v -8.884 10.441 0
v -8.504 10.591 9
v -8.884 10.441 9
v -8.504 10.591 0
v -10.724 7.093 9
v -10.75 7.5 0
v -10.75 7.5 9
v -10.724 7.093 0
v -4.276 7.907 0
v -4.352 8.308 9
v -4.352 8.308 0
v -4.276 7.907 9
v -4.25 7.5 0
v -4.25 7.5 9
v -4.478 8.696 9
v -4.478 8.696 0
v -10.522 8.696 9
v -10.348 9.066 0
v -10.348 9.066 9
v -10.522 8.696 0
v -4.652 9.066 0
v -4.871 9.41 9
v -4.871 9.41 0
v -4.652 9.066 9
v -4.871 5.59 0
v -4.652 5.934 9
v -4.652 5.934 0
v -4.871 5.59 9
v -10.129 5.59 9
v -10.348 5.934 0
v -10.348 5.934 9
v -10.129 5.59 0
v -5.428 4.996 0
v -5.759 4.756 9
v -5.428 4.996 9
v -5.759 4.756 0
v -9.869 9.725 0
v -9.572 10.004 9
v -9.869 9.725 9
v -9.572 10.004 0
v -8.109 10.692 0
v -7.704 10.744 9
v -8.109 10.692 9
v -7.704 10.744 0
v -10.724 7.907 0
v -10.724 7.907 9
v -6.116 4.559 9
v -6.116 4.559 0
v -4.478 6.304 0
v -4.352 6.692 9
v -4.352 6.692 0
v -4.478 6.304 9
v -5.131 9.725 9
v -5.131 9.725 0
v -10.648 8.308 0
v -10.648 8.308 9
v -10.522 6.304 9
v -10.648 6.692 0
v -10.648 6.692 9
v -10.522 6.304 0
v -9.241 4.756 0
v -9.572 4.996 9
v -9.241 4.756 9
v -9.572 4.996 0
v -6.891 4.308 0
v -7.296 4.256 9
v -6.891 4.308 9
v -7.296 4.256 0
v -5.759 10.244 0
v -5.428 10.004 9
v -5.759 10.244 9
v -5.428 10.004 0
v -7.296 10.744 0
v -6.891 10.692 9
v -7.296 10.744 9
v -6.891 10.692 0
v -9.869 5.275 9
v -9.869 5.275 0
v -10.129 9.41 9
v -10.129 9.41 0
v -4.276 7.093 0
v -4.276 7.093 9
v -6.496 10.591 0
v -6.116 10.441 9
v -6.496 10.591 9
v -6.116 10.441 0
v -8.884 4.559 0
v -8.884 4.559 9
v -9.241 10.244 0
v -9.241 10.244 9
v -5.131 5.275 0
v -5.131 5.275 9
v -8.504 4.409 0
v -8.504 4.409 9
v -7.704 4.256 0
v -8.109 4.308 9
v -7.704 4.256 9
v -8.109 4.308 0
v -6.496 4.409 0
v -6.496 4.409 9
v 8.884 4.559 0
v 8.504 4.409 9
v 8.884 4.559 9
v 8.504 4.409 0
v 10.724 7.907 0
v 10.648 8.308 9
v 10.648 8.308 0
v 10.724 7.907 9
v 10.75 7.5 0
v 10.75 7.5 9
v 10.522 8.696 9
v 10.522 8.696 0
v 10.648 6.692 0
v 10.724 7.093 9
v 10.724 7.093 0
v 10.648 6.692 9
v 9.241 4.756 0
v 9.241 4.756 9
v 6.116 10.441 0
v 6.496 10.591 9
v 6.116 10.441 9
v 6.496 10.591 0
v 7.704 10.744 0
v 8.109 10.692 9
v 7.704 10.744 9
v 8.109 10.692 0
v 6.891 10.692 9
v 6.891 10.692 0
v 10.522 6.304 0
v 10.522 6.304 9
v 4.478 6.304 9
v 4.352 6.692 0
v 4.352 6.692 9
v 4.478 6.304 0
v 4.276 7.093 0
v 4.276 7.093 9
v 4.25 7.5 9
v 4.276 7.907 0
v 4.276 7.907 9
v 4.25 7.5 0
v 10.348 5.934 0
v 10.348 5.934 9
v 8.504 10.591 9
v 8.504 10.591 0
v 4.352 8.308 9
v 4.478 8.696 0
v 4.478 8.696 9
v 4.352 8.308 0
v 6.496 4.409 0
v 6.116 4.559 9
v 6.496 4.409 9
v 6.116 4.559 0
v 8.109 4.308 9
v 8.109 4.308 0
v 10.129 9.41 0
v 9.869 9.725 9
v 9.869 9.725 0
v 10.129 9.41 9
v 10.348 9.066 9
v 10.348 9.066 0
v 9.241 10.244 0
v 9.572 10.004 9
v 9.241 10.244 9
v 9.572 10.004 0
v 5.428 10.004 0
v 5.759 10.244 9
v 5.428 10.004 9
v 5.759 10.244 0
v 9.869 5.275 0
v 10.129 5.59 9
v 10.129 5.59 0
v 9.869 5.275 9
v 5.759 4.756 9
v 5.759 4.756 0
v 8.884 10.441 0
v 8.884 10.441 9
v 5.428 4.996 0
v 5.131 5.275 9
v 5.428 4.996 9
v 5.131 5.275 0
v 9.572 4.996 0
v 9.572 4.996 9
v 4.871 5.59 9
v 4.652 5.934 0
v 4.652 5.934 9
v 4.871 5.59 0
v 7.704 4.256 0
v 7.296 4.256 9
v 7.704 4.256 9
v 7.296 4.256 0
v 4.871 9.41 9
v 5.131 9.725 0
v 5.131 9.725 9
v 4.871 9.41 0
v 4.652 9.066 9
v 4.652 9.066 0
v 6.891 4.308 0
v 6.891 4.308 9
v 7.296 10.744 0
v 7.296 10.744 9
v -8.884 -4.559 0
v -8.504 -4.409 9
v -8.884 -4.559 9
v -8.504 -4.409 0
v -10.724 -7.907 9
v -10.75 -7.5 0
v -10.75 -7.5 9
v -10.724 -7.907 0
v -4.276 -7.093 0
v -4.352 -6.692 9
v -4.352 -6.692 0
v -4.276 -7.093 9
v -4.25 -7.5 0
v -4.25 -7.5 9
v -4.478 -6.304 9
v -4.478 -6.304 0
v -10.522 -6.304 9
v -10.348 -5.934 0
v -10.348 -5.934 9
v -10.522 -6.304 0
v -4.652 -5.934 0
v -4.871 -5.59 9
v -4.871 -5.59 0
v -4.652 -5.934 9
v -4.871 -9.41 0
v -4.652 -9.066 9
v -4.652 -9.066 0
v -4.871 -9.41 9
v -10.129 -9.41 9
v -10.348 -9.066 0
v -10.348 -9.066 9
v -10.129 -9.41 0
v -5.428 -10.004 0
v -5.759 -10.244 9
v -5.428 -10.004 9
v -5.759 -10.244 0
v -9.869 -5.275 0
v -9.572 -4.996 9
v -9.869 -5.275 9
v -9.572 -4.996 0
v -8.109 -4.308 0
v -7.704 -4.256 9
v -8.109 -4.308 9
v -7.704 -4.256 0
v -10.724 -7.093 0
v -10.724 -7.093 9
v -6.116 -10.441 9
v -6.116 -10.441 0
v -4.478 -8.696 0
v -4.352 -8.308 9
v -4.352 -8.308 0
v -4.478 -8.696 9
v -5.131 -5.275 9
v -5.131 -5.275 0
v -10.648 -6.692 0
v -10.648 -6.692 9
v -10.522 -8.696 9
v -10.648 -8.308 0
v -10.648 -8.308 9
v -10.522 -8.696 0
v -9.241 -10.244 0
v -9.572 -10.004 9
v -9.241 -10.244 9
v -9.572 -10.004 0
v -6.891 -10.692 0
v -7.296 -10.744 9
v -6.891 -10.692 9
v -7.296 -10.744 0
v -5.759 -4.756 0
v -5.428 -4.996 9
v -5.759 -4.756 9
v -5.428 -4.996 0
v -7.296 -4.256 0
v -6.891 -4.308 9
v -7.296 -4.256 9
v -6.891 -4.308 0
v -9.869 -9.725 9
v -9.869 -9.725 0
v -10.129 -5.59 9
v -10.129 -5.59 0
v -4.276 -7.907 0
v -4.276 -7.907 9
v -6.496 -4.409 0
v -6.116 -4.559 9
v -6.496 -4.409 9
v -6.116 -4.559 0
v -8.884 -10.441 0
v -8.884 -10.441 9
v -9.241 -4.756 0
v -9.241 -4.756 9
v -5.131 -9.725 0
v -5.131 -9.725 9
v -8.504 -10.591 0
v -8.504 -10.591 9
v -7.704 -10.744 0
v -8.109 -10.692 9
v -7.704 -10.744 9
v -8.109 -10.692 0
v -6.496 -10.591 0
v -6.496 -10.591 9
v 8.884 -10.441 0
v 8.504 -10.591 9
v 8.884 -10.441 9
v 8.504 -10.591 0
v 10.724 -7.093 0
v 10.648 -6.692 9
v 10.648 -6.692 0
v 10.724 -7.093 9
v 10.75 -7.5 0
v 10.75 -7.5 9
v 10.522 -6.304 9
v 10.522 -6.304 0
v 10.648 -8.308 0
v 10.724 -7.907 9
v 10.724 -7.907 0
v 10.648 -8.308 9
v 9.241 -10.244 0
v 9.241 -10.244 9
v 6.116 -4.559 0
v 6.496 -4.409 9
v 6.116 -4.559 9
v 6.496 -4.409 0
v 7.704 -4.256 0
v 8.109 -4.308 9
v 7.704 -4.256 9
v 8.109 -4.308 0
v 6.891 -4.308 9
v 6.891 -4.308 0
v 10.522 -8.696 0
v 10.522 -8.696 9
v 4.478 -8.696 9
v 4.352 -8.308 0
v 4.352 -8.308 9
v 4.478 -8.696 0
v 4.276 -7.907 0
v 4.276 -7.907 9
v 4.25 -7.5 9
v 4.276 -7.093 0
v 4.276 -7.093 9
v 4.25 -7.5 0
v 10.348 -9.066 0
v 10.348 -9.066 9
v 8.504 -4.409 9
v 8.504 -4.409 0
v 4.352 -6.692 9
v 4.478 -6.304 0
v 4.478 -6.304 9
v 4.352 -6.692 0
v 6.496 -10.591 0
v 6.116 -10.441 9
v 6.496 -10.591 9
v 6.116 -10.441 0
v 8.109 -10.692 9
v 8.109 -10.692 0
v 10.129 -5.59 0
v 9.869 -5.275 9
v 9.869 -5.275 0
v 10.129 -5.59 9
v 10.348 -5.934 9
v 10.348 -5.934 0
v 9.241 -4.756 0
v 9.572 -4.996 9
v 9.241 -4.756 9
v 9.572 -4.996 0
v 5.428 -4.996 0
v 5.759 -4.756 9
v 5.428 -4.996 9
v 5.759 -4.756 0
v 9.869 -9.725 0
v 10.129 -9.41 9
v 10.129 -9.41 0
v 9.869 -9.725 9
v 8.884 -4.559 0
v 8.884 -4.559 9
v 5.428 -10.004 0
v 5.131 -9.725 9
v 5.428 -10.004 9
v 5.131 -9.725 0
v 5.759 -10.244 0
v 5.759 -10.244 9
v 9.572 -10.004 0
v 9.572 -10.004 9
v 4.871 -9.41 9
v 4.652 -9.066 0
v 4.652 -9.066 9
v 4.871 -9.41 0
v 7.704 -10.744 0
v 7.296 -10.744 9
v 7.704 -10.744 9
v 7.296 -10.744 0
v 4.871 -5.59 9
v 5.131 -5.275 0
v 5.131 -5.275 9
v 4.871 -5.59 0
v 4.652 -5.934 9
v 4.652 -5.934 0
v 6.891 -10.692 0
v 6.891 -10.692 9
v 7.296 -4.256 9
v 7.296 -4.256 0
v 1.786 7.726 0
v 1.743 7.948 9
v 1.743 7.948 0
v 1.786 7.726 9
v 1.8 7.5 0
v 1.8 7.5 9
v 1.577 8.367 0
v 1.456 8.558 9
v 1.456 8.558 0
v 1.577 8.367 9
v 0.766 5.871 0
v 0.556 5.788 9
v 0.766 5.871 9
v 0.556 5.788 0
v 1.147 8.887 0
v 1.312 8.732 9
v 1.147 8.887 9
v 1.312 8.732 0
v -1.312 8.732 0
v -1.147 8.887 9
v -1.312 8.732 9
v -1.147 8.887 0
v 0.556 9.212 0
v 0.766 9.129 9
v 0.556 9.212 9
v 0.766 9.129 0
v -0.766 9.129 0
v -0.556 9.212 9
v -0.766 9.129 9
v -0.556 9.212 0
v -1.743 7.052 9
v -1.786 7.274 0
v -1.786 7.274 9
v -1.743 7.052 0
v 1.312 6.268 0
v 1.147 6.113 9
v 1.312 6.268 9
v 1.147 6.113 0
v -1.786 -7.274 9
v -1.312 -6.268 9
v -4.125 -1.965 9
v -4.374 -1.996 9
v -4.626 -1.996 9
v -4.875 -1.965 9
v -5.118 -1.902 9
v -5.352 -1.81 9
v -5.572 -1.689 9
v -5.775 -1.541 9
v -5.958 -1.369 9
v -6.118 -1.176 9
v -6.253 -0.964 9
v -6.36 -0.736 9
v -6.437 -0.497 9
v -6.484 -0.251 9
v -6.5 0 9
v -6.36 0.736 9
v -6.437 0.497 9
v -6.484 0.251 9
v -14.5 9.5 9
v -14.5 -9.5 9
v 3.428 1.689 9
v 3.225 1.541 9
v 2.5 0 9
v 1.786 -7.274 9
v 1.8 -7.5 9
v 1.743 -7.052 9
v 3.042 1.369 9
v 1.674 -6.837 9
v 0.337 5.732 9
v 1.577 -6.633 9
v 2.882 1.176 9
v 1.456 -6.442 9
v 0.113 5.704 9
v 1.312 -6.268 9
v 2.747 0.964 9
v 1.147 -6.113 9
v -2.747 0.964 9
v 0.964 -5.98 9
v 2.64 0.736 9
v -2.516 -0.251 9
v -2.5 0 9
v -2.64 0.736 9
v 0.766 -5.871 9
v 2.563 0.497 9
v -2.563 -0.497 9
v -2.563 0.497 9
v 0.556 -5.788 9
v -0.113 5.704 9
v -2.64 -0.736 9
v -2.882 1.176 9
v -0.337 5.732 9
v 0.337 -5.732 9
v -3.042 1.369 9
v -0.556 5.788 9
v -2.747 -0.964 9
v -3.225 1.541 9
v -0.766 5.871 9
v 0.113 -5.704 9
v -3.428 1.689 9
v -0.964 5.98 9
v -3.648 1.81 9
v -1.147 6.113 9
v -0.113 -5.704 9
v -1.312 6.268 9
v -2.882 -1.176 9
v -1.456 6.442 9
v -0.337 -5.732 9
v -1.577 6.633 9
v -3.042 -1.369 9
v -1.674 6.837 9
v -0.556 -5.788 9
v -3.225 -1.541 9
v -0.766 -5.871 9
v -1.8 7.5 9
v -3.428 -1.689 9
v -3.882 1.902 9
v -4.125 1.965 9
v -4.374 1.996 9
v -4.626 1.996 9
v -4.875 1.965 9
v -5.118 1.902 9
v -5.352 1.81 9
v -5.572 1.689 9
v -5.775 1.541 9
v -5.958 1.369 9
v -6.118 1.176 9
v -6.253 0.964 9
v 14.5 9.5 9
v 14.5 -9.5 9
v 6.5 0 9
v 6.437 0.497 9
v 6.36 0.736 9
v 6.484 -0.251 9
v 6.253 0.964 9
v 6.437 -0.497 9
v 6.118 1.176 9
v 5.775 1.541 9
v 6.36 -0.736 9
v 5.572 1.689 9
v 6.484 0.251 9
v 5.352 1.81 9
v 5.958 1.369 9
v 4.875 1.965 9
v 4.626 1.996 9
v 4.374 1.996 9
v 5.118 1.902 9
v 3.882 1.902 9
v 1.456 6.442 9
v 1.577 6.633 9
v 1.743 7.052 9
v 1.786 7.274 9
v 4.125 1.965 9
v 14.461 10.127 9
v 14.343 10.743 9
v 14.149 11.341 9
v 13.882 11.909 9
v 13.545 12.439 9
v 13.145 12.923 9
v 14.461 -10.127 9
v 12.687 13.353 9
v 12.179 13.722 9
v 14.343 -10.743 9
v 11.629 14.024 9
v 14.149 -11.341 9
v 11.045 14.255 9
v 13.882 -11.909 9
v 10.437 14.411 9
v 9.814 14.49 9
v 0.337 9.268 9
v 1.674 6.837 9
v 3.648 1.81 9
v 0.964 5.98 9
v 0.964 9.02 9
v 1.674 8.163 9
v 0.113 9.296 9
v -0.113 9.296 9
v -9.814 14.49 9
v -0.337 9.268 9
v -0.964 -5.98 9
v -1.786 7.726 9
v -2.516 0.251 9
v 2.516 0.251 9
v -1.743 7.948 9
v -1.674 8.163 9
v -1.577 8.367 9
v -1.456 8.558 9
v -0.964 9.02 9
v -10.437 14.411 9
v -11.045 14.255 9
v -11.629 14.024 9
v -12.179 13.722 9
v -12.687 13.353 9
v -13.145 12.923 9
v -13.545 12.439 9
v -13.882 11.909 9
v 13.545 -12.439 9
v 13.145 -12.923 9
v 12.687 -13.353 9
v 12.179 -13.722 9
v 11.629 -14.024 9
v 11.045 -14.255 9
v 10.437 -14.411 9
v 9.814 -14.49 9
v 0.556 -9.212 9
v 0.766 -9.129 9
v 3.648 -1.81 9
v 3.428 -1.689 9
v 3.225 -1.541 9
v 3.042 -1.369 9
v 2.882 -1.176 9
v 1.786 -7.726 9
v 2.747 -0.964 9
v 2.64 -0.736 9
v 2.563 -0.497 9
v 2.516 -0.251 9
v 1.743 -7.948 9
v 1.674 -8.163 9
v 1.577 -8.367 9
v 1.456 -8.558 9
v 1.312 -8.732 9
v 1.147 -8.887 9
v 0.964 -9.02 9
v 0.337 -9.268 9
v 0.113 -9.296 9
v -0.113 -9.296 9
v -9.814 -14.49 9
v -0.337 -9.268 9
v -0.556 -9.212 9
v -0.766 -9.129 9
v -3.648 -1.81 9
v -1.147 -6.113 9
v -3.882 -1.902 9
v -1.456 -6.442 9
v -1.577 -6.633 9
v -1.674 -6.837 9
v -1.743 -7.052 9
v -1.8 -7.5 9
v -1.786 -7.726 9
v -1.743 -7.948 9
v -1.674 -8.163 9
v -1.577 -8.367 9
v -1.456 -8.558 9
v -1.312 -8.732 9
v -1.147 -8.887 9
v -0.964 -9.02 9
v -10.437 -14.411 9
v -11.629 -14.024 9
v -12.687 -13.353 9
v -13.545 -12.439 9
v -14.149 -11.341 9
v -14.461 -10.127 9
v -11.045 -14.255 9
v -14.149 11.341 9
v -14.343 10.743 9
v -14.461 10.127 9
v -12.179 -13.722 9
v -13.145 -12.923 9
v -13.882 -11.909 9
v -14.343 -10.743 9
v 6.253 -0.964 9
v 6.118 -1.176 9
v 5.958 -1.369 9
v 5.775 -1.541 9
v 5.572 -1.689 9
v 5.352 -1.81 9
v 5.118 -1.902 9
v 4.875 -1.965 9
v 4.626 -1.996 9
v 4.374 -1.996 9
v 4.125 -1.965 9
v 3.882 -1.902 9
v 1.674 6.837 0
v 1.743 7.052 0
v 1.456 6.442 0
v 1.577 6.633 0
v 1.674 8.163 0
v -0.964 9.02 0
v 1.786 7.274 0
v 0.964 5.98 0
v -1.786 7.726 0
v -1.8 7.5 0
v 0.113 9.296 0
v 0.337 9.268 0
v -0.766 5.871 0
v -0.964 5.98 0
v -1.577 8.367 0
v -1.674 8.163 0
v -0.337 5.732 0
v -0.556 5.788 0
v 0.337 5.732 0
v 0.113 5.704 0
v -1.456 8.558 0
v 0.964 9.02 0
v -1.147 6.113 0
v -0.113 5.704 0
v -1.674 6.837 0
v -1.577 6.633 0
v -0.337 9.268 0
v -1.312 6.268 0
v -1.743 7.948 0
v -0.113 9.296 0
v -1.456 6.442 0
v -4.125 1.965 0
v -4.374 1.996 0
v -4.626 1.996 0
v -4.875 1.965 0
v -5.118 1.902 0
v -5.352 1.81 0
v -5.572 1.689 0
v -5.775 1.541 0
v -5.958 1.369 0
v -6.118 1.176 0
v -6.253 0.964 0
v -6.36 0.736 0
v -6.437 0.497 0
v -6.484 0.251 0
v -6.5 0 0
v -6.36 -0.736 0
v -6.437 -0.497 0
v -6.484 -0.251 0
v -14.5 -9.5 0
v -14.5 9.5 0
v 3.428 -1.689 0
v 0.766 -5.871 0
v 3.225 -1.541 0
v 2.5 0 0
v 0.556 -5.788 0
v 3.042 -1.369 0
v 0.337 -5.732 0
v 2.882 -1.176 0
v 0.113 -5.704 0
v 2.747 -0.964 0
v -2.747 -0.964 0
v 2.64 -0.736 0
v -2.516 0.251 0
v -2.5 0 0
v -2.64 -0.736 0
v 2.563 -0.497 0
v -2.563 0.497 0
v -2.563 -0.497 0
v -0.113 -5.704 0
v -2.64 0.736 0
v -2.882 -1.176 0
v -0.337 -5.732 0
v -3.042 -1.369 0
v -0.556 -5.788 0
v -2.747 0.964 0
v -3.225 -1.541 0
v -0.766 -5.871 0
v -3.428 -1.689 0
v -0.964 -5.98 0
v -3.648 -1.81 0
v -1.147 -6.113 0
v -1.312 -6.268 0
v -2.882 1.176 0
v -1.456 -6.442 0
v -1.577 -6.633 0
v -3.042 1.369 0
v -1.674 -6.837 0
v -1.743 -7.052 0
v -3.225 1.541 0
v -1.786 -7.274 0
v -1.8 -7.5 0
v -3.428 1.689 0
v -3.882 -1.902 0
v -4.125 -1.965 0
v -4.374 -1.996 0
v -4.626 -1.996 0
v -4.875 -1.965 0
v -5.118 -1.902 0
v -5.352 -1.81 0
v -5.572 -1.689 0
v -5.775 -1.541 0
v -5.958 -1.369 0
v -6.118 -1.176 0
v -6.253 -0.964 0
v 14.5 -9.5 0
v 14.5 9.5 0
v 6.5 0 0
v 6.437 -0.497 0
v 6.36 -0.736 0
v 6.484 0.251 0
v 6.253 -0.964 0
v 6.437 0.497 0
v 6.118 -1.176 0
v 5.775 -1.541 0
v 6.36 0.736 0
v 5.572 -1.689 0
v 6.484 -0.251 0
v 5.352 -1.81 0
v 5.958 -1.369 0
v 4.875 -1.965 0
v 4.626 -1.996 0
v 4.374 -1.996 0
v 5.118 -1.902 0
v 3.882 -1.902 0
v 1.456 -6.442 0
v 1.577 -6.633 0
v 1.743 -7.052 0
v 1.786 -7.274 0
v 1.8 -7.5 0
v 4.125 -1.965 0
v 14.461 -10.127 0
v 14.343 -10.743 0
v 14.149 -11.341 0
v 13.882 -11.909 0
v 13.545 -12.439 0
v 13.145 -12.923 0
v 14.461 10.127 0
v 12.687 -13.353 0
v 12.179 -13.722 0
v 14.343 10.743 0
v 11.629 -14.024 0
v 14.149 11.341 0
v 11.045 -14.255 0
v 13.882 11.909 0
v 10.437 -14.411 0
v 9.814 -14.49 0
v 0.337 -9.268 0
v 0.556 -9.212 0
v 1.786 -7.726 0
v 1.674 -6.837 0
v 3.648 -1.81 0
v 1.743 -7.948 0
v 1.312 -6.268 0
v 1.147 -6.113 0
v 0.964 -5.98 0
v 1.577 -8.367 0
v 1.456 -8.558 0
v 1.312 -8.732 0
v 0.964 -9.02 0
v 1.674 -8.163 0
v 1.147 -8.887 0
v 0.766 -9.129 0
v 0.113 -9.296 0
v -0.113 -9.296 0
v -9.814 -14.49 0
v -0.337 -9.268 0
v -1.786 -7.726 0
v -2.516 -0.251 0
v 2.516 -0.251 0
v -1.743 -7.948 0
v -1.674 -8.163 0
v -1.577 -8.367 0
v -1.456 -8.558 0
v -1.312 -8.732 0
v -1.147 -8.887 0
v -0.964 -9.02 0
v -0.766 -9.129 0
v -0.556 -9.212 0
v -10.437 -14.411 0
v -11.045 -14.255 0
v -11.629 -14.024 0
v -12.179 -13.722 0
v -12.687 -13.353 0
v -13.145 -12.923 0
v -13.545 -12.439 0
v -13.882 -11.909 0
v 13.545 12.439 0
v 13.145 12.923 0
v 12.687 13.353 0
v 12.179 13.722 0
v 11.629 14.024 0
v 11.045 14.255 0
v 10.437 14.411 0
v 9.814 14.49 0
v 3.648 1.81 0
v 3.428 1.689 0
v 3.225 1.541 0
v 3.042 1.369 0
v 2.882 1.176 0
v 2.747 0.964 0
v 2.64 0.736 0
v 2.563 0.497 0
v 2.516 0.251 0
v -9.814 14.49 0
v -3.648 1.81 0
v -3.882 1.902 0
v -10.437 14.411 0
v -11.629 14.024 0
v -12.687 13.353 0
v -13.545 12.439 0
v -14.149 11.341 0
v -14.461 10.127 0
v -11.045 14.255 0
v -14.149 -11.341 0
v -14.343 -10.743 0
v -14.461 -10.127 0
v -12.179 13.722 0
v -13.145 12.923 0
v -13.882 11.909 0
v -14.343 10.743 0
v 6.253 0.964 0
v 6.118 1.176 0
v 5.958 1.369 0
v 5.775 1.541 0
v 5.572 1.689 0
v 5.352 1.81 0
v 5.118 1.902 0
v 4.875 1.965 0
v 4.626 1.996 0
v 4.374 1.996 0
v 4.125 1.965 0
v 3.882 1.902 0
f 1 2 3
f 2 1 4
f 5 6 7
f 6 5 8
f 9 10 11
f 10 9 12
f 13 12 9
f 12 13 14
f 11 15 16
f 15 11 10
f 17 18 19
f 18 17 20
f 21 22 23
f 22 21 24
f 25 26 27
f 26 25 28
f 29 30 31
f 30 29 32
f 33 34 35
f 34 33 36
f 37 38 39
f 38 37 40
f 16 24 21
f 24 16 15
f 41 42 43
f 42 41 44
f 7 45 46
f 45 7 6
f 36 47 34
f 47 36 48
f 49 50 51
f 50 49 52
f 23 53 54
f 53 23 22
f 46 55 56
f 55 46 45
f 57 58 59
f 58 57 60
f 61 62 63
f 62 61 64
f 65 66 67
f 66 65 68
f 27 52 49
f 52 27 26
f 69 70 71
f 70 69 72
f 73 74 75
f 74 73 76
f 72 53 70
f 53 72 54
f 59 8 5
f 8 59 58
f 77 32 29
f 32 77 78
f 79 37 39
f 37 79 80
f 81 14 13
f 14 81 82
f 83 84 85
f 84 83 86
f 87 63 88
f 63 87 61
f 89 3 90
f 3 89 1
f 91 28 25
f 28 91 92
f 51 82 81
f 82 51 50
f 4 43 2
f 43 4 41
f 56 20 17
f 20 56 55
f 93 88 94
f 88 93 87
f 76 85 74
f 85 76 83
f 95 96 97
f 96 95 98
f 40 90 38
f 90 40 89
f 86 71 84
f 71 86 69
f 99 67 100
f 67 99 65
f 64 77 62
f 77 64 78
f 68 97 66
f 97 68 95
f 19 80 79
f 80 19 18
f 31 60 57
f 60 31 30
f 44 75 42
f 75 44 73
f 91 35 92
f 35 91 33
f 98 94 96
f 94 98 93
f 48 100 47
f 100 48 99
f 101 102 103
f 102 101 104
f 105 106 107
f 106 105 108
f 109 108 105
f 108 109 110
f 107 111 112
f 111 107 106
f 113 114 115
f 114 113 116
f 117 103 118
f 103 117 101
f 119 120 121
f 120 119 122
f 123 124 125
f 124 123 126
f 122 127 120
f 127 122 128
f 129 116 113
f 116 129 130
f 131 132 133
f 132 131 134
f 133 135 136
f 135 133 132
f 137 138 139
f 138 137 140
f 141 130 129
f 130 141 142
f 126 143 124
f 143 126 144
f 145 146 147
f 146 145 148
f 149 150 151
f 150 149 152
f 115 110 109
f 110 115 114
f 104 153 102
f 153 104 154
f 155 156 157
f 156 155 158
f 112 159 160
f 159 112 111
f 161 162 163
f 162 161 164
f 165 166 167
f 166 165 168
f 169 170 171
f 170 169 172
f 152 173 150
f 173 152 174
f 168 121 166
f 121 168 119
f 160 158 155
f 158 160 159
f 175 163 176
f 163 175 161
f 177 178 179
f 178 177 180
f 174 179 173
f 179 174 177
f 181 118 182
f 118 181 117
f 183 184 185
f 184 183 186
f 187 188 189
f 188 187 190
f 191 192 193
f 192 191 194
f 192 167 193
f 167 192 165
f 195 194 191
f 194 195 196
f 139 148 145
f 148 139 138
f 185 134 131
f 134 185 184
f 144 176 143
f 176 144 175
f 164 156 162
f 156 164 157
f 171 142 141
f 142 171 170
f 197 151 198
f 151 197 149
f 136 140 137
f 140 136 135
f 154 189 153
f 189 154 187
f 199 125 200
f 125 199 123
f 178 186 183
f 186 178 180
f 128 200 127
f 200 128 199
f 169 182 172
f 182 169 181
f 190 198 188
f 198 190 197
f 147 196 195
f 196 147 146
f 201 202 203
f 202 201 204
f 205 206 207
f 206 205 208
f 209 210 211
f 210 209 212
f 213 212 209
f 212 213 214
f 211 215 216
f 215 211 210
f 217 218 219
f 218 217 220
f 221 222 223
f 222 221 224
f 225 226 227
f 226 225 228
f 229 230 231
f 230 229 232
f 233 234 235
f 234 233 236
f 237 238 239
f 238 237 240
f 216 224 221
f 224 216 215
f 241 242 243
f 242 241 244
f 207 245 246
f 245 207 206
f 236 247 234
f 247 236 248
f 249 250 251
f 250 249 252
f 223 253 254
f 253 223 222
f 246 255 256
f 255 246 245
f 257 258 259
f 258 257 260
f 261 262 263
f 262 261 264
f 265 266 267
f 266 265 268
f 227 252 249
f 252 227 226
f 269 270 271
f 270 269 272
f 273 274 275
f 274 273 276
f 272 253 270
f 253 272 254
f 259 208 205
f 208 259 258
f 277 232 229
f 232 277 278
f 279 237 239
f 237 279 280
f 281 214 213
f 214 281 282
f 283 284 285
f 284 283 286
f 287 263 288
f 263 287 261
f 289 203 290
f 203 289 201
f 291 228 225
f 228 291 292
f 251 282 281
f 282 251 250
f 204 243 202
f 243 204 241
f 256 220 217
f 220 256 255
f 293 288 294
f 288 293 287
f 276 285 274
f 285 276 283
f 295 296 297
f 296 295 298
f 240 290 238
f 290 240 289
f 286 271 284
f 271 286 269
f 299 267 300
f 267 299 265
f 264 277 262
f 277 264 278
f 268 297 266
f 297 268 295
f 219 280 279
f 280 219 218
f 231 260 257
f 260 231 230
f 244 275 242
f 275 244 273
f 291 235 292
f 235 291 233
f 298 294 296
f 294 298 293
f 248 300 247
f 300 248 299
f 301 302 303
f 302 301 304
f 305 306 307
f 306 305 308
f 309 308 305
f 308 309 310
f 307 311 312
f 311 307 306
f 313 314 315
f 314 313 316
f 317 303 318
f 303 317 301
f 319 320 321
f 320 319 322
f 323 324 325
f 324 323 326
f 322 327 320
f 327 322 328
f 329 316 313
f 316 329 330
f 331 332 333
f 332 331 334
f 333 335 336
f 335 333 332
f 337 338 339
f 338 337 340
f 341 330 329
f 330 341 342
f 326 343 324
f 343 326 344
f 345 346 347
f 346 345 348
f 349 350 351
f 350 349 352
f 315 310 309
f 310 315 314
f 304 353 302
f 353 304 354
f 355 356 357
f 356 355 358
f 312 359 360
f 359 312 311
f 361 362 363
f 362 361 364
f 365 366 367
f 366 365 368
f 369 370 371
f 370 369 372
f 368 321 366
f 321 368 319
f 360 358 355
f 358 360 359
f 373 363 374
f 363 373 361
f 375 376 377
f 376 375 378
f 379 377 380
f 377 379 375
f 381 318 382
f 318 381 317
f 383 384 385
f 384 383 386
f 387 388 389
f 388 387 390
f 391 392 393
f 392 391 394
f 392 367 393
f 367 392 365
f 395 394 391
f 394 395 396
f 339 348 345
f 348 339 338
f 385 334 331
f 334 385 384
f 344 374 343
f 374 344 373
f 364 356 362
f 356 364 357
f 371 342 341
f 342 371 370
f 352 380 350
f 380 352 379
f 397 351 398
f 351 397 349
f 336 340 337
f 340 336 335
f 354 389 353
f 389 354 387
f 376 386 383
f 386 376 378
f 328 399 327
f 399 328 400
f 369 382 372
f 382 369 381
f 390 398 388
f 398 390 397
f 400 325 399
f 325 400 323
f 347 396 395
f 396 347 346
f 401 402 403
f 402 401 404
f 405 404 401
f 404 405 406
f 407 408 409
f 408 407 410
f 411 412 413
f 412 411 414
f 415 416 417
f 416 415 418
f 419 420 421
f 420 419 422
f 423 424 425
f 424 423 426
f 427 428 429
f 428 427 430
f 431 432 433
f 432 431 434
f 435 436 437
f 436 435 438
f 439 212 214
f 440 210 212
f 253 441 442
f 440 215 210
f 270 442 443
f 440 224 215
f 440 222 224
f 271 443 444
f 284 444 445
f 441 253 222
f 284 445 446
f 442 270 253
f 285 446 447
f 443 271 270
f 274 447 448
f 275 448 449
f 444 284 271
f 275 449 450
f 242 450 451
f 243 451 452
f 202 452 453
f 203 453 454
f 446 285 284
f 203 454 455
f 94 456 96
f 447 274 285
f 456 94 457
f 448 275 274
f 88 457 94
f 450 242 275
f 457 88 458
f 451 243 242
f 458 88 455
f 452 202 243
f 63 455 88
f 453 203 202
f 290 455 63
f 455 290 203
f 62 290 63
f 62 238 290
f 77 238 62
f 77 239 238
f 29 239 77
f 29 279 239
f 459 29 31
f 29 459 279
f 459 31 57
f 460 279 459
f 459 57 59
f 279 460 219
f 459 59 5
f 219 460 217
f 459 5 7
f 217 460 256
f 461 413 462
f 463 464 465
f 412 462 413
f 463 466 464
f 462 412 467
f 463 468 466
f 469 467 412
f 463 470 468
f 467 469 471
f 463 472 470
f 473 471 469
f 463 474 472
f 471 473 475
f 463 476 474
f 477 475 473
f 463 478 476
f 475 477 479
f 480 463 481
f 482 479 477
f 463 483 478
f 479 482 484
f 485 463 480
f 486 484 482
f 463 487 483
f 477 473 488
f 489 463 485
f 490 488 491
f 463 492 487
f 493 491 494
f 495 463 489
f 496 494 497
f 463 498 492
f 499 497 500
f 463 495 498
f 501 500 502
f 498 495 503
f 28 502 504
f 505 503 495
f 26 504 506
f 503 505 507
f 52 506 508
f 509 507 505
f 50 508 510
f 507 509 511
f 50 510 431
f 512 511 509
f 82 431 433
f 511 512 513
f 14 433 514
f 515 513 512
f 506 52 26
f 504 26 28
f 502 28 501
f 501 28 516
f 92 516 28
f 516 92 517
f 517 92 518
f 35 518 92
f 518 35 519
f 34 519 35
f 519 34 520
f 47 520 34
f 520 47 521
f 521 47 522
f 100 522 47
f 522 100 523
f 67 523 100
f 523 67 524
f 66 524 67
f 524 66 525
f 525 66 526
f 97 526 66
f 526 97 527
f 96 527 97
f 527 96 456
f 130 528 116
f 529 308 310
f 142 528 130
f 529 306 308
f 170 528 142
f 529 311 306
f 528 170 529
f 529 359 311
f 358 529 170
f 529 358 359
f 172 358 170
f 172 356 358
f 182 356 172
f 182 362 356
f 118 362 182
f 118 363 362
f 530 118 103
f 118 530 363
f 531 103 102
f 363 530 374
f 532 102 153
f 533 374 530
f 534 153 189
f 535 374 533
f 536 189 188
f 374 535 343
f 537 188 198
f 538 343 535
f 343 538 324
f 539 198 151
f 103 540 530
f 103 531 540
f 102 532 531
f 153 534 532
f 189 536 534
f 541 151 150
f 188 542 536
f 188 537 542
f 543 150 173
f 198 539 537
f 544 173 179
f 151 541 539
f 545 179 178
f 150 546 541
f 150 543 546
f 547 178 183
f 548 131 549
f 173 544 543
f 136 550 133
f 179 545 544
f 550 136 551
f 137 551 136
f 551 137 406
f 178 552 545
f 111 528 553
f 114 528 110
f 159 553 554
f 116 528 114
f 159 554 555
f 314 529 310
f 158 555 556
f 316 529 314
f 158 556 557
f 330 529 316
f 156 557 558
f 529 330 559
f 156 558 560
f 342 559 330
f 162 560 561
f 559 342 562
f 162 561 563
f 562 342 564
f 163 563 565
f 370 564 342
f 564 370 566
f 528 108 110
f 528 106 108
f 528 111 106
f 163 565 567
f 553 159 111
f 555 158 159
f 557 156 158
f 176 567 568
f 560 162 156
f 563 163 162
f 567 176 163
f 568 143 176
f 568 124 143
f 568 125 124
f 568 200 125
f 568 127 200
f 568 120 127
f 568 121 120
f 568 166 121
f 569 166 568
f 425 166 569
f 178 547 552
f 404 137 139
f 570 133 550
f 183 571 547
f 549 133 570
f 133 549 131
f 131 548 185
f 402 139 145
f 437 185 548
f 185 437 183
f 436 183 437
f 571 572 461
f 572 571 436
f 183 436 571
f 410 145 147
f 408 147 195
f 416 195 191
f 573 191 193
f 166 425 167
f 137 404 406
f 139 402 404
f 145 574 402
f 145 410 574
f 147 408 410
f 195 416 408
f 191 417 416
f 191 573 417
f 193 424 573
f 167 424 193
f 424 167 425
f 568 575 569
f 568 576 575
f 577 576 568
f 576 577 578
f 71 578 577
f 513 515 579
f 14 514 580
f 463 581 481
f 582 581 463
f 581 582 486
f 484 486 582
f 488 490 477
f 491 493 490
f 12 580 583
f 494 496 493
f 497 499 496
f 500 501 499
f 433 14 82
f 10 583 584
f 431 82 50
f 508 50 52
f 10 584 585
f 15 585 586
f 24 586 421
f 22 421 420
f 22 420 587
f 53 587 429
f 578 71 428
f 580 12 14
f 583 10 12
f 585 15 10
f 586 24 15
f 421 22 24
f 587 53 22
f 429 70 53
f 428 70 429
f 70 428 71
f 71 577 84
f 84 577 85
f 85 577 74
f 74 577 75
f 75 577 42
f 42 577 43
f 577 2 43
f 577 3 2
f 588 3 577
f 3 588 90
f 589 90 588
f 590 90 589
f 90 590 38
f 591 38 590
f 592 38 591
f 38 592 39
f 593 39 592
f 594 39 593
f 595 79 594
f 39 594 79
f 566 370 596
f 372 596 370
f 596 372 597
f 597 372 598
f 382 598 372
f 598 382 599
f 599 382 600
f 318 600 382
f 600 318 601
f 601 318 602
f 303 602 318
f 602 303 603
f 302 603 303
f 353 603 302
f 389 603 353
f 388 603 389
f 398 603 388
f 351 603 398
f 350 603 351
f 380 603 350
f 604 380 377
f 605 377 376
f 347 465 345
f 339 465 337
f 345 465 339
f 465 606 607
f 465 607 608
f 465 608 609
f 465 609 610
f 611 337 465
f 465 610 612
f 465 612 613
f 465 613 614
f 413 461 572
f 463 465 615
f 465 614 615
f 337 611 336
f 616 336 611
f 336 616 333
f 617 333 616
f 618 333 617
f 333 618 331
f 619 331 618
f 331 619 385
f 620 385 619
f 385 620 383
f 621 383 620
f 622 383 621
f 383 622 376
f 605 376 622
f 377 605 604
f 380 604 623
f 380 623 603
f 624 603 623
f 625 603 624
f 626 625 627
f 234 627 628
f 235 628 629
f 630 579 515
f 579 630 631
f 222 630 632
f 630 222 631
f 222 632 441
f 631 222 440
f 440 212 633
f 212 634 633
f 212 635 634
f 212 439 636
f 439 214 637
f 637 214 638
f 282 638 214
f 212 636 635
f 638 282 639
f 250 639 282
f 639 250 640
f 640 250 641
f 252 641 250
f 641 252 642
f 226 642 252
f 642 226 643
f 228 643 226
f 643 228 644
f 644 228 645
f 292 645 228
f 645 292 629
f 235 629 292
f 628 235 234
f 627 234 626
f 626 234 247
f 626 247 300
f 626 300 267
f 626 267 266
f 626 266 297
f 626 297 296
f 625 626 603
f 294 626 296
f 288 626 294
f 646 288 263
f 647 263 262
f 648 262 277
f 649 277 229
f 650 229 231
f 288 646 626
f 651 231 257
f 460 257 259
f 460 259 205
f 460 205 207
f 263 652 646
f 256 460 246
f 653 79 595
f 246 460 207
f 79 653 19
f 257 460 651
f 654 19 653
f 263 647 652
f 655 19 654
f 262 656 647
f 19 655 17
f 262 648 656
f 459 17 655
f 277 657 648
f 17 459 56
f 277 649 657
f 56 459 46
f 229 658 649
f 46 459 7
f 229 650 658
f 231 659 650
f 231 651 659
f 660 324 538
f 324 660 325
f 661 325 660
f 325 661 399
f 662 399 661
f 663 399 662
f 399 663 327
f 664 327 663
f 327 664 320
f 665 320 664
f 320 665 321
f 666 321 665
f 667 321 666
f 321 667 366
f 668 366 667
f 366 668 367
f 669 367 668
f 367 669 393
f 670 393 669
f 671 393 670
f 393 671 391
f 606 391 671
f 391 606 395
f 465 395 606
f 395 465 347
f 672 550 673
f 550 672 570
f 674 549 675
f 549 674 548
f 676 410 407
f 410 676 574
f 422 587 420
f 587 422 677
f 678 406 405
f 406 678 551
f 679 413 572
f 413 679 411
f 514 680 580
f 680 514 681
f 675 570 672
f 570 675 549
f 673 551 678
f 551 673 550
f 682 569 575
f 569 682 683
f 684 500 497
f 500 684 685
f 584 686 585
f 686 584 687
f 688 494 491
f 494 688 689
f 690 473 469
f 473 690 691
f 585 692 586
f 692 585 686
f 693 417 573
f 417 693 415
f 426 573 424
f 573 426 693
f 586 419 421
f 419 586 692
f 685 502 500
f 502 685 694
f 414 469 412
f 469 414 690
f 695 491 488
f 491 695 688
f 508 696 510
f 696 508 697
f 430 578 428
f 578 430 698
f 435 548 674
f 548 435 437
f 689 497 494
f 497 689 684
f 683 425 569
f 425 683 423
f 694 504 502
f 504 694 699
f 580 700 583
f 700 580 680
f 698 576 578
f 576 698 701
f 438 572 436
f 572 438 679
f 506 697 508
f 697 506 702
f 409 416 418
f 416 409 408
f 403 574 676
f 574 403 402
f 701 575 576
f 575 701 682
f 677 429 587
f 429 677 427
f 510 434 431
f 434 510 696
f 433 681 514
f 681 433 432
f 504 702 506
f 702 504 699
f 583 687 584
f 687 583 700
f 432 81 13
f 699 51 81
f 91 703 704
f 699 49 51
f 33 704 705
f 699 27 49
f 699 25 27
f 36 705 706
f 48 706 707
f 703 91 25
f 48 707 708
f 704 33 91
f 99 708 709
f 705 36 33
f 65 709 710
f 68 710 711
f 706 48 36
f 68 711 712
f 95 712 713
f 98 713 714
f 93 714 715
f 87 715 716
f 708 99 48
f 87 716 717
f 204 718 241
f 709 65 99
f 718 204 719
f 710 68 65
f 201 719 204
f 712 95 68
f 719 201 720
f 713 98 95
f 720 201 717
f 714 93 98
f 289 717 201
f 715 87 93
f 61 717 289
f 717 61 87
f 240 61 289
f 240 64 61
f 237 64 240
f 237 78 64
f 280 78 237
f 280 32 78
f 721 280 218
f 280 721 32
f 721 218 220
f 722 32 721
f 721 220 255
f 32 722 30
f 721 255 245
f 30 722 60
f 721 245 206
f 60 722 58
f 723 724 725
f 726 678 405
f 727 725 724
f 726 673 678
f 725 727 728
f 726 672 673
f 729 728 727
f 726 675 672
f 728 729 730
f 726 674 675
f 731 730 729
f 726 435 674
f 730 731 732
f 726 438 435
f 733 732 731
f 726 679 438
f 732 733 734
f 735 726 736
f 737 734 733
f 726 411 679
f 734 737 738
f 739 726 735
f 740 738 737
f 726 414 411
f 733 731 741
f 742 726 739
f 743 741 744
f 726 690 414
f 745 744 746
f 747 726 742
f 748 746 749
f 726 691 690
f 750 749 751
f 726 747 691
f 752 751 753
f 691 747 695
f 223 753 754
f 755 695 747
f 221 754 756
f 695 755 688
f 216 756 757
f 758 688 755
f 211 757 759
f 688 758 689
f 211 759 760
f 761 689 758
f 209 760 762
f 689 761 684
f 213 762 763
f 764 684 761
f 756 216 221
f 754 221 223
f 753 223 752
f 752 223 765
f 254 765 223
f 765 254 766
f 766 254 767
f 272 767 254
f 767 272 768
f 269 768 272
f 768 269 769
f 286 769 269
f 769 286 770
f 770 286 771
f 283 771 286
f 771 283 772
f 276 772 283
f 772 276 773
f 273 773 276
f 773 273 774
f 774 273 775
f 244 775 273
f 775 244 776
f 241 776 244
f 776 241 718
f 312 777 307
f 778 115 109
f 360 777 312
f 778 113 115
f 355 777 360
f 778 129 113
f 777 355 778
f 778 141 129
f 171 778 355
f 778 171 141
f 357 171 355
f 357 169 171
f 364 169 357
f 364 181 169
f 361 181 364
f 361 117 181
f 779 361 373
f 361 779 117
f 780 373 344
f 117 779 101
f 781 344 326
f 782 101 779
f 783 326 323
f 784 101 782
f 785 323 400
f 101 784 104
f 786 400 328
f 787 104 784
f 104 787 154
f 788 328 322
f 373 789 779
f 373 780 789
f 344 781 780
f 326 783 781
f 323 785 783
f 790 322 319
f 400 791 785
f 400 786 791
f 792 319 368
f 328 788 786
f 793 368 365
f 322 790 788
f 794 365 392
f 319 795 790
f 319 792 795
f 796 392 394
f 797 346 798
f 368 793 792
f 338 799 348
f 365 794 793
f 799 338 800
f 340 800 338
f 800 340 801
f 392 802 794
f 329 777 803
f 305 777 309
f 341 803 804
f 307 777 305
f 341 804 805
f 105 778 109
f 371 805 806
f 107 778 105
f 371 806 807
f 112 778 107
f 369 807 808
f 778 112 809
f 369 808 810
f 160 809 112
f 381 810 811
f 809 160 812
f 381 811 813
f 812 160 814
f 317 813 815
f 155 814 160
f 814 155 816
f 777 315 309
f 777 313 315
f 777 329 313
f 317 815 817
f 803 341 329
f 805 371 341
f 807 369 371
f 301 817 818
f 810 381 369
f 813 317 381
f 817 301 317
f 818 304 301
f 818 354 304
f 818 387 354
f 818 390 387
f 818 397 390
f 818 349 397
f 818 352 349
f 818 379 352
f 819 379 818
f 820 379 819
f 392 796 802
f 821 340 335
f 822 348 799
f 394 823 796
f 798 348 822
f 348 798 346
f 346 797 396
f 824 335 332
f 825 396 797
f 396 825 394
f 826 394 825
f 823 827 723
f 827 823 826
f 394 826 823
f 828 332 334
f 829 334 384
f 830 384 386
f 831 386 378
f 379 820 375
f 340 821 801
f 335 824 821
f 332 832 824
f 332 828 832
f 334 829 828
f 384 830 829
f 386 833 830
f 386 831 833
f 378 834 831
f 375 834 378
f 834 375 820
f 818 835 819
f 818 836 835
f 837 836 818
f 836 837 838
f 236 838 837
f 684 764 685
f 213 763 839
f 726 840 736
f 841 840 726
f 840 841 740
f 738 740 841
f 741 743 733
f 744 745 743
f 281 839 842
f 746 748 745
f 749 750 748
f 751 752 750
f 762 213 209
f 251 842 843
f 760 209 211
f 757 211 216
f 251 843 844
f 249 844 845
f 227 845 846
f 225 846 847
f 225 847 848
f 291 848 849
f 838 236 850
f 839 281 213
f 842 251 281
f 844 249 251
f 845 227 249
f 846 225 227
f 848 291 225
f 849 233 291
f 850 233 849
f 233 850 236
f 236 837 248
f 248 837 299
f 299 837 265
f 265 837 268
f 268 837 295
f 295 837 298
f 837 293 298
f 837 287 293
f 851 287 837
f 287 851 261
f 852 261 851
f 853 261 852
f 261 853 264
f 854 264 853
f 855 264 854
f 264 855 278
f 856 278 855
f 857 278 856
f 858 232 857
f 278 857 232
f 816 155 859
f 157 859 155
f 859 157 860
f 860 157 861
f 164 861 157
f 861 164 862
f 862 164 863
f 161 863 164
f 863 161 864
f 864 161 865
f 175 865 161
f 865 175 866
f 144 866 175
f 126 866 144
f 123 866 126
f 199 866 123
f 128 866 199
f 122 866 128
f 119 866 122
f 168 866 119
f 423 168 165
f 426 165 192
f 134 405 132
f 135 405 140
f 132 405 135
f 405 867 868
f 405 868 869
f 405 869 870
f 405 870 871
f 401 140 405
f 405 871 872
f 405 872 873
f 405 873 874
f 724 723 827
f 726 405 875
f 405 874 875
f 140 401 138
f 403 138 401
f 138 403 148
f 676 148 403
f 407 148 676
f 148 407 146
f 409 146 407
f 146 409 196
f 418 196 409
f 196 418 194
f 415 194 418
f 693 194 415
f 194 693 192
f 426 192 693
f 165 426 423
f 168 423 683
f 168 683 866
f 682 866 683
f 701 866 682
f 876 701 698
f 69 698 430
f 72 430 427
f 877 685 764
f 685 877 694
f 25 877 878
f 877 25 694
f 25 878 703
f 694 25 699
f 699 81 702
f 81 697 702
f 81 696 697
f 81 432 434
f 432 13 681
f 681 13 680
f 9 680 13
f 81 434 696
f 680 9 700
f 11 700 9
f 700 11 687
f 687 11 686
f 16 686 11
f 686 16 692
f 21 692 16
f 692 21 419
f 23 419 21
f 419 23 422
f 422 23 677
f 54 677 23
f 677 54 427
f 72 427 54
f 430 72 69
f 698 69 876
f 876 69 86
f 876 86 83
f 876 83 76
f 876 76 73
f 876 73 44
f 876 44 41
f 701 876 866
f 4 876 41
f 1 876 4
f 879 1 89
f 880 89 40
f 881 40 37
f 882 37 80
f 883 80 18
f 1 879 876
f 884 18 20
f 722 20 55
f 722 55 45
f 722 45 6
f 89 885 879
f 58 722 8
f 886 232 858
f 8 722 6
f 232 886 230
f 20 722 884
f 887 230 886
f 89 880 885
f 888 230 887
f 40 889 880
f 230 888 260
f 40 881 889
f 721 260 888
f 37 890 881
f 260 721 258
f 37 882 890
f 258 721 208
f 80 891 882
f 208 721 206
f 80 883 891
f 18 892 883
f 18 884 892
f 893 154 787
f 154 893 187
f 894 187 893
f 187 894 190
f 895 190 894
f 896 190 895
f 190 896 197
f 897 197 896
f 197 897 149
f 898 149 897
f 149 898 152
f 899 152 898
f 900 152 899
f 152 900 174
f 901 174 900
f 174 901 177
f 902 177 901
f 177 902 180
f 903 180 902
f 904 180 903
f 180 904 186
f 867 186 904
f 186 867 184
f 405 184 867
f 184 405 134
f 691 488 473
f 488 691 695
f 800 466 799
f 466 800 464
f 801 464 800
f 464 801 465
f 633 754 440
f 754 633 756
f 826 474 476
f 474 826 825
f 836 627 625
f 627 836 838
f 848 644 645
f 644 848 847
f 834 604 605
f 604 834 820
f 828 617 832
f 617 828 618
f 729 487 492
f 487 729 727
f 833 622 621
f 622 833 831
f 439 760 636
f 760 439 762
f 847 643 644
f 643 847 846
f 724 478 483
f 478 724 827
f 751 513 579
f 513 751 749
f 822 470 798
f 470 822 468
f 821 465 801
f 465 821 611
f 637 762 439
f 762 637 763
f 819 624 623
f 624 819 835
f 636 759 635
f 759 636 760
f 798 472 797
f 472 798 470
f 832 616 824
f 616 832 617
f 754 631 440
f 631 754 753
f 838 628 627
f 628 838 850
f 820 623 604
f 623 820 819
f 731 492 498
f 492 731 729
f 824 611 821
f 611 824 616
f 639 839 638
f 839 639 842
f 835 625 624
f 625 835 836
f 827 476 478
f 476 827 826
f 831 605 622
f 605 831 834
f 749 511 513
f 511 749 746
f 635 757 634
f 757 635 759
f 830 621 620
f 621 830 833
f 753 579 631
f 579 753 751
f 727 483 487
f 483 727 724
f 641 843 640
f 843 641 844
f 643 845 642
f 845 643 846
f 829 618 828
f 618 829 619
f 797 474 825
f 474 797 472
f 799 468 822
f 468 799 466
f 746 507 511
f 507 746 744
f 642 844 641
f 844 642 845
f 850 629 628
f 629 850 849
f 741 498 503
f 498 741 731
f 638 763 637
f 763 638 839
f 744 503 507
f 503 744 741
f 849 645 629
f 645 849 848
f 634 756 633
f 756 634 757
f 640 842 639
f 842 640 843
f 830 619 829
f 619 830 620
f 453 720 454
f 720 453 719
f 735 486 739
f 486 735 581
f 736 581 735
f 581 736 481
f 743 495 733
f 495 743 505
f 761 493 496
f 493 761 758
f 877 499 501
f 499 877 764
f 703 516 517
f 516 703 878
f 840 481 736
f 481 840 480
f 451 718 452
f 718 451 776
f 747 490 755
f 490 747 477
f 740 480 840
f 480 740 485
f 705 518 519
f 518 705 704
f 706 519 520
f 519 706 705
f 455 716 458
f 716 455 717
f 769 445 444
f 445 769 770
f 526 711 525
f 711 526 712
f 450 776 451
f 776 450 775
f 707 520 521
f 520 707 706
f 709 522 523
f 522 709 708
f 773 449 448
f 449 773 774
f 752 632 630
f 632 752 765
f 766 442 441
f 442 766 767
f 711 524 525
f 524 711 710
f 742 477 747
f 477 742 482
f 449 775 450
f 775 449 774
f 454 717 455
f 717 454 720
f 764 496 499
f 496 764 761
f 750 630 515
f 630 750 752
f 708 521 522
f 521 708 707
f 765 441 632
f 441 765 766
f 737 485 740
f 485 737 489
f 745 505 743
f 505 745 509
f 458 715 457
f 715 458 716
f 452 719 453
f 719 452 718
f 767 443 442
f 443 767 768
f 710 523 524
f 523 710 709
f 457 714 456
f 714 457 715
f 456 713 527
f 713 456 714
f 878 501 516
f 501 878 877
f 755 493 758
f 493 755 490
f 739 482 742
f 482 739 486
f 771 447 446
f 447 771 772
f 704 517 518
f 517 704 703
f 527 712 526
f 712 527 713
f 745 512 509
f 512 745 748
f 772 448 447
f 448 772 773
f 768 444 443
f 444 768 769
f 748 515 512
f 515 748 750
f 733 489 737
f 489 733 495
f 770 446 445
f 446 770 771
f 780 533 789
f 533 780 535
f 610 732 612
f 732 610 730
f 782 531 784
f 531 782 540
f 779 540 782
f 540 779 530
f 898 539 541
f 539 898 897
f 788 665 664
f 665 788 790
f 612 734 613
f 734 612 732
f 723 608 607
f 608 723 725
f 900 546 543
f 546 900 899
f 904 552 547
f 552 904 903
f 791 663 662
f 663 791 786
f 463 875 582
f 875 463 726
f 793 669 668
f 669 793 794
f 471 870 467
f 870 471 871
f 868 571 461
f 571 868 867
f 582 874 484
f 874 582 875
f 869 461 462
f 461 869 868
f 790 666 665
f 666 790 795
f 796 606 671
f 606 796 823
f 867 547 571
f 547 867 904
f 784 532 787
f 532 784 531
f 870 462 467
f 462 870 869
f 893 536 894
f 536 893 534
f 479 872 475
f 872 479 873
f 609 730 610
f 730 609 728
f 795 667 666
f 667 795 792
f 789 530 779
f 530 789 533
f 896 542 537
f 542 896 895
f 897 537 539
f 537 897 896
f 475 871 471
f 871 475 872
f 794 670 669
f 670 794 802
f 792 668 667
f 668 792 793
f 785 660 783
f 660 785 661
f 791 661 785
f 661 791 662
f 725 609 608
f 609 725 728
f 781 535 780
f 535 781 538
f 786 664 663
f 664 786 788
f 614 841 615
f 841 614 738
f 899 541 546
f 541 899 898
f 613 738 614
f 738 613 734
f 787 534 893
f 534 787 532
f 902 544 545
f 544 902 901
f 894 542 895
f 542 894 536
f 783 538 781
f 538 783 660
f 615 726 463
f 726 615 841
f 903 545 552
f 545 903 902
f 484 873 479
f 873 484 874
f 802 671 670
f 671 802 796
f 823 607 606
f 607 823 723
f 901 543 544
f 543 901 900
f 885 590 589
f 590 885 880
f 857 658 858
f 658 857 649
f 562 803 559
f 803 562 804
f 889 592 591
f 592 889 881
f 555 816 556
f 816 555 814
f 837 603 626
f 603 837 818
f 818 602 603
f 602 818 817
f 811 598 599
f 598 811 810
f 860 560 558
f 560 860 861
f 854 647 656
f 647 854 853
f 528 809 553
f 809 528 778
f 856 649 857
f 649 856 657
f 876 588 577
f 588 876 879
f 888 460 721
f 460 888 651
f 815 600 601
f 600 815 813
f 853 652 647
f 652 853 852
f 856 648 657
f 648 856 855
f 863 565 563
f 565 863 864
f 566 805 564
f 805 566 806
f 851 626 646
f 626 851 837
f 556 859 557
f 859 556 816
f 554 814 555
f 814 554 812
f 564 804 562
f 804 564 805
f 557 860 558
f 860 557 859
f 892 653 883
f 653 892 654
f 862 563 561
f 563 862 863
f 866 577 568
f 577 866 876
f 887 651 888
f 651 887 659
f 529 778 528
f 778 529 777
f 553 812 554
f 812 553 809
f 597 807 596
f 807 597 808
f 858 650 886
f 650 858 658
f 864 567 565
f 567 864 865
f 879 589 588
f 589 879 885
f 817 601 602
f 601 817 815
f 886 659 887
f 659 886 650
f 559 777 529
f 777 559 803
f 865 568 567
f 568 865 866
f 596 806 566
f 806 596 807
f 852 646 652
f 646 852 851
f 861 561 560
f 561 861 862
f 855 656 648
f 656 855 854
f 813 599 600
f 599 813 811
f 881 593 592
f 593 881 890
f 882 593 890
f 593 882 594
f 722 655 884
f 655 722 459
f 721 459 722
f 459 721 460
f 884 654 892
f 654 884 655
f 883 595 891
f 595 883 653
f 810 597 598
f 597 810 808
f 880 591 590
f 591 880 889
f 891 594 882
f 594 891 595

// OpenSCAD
$fn = 50;


difference() {
	union() {
		hull() {
			translate(v = [-9.5000000000, 9.5000000000, 0]) {
				cylinder(h = 9, r = 5);
			}
			translate(v = [9.5000000000, 9.5000000000, 0]) {
				cylinder(h = 9, r = 5);
			}
			translate(v = [-9.5000000000, -9.5000000000, 0]) {
				cylinder(h = 9, r = 5);
			}
			translate(v = [9.5000000000, -9.5000000000, 0]) {
				cylinder(h = 9, r = 5);
			}
		}
	}
	union() {
		#translate(v = [-7.5000000000, 7.5000000000, 0]) {
			cylinder(h = 9, r = 3.2500000000);
		}
		#translate(v = [7.5000000000, 7.5000000000, 0]) {
			cylinder(h = 9, r = 3.2500000000);
		}
		#translate(v = [-7.5000000000, -7.5000000000, 0]) {
			cylinder(h = 9, r = 3.2500000000);
		}
		#translate(v = [7.5000000000, -7.5000000000, 0]) {
			cylinder(h = 9, r = 3.2500000000);
		}
		#translate(v = [-7.5000000000, -7.5000000000, -100.0000000000]) {
			cylinder(h = 200, r = 3.2500000000);
		}
		#translate(v = [-7.5000000000, 7.5000000000, -100.0000000000]) {
			cylinder(h = 200, r = 3.2500000000);
		}
		#translate(v = [7.5000000000, -7.5000000000, -100.0000000000]) {
			cylinder(h = 200, r = 3.2500000000);
		}
		#translate(v = [7.5000000000, 7.5000000000, -100.0000000000]) {
			cylinder(h = 200, r = 3.2500000000);
		}
		#translate(v = [-7.5000000000, 7.5000000000, 0]) {
			cylinder(h = 9, r = 1.8000000000);
		}
		#translate(v = [0.0000000000, 7.5000000000, 0]) {
			cylinder(h = 9, r = 1.8000000000);
		}
		#translate(v = [7.5000000000, 7.5000000000, 0]) {
			cylinder(h = 9, r = 1.8000000000);
		}
		#translate(v = [-7.5000000000, -7.5000000000, 0]) {
			cylinder(h = 9, r = 1.8000000000);
		}
		#translate(v = [0.0000000000, -7.5000000000, 0]) {
			cylinder(h = 9, r = 1.8000000000);
		}
		#translate(v = [7.5000000000, -7.5000000000, 0]) {
			cylinder(h = 9, r = 1.8000000000);
		}
		#translate(v = [-7.5000000000, 7.5000000000, 0]) {
			cylinder(h = 9, r = 1.8000000000);
		}
		#translate(v = [0.0000000000, 7.5000000000, 0]) {
			cylinder(h = 9, r = 1.8000000000);
		}
		#translate(v = [7.5000000000, 7.5000000000, 0]) {
			cylinder(h = 9, r = 1.8000000000);
		}
		#translate(v = [-7.5000000000, -7.5000000000, 0]) {
			cylinder(h = 9, r = 1.8000000000);
		}
		#translate(v = [0.0000000000, -7.5000000000, 0]) {
			cylinder(h = 9, r = 1.8000000000);
		}
		#translate(v = [7.5000000000, -7.5000000000, 0]) {
			cylinder(h = 9, r = 1.8000000000);
		}
		#translate(v = [-7.5000000000, 7.5000000000, 0]) {
			cylinder(h = 9, r = 1.8000000000);
		}
		#translate(v = [0.0000000000, 7.5000000000, 0]) {
			cylinder(h = 9, r = 1.8000000000);
		}
		#translate(v = [7.5000000000, 7.5000000000, 0]) {
			cylinder(h = 9, r = 1.8000000000);
		}
		#translate(v = [-7.5000000000, -7.5000000000, 0]) {
			cylinder(h = 9, r = 1.8000000000);
		}
		#translate(v = [0.0000000000, -7.5000000000, 0]) {
			cylinder(h = 9, r = 1.8000000000);
		}
		#translate(v = [7.5000000000, -7.5000000000, 0]) {
			cylinder(h = 9, r = 1.8000000000);
		}
		#translate(v = [-4.5000000000, 0, 0]) {
			cylinder(h = 9, r = 2.0000000000);
		}
		#translate(v = [4.5000000000, 0, 0]) {
			cylinder(h = 9, r = 2.0000000000);
		}
	}
}
